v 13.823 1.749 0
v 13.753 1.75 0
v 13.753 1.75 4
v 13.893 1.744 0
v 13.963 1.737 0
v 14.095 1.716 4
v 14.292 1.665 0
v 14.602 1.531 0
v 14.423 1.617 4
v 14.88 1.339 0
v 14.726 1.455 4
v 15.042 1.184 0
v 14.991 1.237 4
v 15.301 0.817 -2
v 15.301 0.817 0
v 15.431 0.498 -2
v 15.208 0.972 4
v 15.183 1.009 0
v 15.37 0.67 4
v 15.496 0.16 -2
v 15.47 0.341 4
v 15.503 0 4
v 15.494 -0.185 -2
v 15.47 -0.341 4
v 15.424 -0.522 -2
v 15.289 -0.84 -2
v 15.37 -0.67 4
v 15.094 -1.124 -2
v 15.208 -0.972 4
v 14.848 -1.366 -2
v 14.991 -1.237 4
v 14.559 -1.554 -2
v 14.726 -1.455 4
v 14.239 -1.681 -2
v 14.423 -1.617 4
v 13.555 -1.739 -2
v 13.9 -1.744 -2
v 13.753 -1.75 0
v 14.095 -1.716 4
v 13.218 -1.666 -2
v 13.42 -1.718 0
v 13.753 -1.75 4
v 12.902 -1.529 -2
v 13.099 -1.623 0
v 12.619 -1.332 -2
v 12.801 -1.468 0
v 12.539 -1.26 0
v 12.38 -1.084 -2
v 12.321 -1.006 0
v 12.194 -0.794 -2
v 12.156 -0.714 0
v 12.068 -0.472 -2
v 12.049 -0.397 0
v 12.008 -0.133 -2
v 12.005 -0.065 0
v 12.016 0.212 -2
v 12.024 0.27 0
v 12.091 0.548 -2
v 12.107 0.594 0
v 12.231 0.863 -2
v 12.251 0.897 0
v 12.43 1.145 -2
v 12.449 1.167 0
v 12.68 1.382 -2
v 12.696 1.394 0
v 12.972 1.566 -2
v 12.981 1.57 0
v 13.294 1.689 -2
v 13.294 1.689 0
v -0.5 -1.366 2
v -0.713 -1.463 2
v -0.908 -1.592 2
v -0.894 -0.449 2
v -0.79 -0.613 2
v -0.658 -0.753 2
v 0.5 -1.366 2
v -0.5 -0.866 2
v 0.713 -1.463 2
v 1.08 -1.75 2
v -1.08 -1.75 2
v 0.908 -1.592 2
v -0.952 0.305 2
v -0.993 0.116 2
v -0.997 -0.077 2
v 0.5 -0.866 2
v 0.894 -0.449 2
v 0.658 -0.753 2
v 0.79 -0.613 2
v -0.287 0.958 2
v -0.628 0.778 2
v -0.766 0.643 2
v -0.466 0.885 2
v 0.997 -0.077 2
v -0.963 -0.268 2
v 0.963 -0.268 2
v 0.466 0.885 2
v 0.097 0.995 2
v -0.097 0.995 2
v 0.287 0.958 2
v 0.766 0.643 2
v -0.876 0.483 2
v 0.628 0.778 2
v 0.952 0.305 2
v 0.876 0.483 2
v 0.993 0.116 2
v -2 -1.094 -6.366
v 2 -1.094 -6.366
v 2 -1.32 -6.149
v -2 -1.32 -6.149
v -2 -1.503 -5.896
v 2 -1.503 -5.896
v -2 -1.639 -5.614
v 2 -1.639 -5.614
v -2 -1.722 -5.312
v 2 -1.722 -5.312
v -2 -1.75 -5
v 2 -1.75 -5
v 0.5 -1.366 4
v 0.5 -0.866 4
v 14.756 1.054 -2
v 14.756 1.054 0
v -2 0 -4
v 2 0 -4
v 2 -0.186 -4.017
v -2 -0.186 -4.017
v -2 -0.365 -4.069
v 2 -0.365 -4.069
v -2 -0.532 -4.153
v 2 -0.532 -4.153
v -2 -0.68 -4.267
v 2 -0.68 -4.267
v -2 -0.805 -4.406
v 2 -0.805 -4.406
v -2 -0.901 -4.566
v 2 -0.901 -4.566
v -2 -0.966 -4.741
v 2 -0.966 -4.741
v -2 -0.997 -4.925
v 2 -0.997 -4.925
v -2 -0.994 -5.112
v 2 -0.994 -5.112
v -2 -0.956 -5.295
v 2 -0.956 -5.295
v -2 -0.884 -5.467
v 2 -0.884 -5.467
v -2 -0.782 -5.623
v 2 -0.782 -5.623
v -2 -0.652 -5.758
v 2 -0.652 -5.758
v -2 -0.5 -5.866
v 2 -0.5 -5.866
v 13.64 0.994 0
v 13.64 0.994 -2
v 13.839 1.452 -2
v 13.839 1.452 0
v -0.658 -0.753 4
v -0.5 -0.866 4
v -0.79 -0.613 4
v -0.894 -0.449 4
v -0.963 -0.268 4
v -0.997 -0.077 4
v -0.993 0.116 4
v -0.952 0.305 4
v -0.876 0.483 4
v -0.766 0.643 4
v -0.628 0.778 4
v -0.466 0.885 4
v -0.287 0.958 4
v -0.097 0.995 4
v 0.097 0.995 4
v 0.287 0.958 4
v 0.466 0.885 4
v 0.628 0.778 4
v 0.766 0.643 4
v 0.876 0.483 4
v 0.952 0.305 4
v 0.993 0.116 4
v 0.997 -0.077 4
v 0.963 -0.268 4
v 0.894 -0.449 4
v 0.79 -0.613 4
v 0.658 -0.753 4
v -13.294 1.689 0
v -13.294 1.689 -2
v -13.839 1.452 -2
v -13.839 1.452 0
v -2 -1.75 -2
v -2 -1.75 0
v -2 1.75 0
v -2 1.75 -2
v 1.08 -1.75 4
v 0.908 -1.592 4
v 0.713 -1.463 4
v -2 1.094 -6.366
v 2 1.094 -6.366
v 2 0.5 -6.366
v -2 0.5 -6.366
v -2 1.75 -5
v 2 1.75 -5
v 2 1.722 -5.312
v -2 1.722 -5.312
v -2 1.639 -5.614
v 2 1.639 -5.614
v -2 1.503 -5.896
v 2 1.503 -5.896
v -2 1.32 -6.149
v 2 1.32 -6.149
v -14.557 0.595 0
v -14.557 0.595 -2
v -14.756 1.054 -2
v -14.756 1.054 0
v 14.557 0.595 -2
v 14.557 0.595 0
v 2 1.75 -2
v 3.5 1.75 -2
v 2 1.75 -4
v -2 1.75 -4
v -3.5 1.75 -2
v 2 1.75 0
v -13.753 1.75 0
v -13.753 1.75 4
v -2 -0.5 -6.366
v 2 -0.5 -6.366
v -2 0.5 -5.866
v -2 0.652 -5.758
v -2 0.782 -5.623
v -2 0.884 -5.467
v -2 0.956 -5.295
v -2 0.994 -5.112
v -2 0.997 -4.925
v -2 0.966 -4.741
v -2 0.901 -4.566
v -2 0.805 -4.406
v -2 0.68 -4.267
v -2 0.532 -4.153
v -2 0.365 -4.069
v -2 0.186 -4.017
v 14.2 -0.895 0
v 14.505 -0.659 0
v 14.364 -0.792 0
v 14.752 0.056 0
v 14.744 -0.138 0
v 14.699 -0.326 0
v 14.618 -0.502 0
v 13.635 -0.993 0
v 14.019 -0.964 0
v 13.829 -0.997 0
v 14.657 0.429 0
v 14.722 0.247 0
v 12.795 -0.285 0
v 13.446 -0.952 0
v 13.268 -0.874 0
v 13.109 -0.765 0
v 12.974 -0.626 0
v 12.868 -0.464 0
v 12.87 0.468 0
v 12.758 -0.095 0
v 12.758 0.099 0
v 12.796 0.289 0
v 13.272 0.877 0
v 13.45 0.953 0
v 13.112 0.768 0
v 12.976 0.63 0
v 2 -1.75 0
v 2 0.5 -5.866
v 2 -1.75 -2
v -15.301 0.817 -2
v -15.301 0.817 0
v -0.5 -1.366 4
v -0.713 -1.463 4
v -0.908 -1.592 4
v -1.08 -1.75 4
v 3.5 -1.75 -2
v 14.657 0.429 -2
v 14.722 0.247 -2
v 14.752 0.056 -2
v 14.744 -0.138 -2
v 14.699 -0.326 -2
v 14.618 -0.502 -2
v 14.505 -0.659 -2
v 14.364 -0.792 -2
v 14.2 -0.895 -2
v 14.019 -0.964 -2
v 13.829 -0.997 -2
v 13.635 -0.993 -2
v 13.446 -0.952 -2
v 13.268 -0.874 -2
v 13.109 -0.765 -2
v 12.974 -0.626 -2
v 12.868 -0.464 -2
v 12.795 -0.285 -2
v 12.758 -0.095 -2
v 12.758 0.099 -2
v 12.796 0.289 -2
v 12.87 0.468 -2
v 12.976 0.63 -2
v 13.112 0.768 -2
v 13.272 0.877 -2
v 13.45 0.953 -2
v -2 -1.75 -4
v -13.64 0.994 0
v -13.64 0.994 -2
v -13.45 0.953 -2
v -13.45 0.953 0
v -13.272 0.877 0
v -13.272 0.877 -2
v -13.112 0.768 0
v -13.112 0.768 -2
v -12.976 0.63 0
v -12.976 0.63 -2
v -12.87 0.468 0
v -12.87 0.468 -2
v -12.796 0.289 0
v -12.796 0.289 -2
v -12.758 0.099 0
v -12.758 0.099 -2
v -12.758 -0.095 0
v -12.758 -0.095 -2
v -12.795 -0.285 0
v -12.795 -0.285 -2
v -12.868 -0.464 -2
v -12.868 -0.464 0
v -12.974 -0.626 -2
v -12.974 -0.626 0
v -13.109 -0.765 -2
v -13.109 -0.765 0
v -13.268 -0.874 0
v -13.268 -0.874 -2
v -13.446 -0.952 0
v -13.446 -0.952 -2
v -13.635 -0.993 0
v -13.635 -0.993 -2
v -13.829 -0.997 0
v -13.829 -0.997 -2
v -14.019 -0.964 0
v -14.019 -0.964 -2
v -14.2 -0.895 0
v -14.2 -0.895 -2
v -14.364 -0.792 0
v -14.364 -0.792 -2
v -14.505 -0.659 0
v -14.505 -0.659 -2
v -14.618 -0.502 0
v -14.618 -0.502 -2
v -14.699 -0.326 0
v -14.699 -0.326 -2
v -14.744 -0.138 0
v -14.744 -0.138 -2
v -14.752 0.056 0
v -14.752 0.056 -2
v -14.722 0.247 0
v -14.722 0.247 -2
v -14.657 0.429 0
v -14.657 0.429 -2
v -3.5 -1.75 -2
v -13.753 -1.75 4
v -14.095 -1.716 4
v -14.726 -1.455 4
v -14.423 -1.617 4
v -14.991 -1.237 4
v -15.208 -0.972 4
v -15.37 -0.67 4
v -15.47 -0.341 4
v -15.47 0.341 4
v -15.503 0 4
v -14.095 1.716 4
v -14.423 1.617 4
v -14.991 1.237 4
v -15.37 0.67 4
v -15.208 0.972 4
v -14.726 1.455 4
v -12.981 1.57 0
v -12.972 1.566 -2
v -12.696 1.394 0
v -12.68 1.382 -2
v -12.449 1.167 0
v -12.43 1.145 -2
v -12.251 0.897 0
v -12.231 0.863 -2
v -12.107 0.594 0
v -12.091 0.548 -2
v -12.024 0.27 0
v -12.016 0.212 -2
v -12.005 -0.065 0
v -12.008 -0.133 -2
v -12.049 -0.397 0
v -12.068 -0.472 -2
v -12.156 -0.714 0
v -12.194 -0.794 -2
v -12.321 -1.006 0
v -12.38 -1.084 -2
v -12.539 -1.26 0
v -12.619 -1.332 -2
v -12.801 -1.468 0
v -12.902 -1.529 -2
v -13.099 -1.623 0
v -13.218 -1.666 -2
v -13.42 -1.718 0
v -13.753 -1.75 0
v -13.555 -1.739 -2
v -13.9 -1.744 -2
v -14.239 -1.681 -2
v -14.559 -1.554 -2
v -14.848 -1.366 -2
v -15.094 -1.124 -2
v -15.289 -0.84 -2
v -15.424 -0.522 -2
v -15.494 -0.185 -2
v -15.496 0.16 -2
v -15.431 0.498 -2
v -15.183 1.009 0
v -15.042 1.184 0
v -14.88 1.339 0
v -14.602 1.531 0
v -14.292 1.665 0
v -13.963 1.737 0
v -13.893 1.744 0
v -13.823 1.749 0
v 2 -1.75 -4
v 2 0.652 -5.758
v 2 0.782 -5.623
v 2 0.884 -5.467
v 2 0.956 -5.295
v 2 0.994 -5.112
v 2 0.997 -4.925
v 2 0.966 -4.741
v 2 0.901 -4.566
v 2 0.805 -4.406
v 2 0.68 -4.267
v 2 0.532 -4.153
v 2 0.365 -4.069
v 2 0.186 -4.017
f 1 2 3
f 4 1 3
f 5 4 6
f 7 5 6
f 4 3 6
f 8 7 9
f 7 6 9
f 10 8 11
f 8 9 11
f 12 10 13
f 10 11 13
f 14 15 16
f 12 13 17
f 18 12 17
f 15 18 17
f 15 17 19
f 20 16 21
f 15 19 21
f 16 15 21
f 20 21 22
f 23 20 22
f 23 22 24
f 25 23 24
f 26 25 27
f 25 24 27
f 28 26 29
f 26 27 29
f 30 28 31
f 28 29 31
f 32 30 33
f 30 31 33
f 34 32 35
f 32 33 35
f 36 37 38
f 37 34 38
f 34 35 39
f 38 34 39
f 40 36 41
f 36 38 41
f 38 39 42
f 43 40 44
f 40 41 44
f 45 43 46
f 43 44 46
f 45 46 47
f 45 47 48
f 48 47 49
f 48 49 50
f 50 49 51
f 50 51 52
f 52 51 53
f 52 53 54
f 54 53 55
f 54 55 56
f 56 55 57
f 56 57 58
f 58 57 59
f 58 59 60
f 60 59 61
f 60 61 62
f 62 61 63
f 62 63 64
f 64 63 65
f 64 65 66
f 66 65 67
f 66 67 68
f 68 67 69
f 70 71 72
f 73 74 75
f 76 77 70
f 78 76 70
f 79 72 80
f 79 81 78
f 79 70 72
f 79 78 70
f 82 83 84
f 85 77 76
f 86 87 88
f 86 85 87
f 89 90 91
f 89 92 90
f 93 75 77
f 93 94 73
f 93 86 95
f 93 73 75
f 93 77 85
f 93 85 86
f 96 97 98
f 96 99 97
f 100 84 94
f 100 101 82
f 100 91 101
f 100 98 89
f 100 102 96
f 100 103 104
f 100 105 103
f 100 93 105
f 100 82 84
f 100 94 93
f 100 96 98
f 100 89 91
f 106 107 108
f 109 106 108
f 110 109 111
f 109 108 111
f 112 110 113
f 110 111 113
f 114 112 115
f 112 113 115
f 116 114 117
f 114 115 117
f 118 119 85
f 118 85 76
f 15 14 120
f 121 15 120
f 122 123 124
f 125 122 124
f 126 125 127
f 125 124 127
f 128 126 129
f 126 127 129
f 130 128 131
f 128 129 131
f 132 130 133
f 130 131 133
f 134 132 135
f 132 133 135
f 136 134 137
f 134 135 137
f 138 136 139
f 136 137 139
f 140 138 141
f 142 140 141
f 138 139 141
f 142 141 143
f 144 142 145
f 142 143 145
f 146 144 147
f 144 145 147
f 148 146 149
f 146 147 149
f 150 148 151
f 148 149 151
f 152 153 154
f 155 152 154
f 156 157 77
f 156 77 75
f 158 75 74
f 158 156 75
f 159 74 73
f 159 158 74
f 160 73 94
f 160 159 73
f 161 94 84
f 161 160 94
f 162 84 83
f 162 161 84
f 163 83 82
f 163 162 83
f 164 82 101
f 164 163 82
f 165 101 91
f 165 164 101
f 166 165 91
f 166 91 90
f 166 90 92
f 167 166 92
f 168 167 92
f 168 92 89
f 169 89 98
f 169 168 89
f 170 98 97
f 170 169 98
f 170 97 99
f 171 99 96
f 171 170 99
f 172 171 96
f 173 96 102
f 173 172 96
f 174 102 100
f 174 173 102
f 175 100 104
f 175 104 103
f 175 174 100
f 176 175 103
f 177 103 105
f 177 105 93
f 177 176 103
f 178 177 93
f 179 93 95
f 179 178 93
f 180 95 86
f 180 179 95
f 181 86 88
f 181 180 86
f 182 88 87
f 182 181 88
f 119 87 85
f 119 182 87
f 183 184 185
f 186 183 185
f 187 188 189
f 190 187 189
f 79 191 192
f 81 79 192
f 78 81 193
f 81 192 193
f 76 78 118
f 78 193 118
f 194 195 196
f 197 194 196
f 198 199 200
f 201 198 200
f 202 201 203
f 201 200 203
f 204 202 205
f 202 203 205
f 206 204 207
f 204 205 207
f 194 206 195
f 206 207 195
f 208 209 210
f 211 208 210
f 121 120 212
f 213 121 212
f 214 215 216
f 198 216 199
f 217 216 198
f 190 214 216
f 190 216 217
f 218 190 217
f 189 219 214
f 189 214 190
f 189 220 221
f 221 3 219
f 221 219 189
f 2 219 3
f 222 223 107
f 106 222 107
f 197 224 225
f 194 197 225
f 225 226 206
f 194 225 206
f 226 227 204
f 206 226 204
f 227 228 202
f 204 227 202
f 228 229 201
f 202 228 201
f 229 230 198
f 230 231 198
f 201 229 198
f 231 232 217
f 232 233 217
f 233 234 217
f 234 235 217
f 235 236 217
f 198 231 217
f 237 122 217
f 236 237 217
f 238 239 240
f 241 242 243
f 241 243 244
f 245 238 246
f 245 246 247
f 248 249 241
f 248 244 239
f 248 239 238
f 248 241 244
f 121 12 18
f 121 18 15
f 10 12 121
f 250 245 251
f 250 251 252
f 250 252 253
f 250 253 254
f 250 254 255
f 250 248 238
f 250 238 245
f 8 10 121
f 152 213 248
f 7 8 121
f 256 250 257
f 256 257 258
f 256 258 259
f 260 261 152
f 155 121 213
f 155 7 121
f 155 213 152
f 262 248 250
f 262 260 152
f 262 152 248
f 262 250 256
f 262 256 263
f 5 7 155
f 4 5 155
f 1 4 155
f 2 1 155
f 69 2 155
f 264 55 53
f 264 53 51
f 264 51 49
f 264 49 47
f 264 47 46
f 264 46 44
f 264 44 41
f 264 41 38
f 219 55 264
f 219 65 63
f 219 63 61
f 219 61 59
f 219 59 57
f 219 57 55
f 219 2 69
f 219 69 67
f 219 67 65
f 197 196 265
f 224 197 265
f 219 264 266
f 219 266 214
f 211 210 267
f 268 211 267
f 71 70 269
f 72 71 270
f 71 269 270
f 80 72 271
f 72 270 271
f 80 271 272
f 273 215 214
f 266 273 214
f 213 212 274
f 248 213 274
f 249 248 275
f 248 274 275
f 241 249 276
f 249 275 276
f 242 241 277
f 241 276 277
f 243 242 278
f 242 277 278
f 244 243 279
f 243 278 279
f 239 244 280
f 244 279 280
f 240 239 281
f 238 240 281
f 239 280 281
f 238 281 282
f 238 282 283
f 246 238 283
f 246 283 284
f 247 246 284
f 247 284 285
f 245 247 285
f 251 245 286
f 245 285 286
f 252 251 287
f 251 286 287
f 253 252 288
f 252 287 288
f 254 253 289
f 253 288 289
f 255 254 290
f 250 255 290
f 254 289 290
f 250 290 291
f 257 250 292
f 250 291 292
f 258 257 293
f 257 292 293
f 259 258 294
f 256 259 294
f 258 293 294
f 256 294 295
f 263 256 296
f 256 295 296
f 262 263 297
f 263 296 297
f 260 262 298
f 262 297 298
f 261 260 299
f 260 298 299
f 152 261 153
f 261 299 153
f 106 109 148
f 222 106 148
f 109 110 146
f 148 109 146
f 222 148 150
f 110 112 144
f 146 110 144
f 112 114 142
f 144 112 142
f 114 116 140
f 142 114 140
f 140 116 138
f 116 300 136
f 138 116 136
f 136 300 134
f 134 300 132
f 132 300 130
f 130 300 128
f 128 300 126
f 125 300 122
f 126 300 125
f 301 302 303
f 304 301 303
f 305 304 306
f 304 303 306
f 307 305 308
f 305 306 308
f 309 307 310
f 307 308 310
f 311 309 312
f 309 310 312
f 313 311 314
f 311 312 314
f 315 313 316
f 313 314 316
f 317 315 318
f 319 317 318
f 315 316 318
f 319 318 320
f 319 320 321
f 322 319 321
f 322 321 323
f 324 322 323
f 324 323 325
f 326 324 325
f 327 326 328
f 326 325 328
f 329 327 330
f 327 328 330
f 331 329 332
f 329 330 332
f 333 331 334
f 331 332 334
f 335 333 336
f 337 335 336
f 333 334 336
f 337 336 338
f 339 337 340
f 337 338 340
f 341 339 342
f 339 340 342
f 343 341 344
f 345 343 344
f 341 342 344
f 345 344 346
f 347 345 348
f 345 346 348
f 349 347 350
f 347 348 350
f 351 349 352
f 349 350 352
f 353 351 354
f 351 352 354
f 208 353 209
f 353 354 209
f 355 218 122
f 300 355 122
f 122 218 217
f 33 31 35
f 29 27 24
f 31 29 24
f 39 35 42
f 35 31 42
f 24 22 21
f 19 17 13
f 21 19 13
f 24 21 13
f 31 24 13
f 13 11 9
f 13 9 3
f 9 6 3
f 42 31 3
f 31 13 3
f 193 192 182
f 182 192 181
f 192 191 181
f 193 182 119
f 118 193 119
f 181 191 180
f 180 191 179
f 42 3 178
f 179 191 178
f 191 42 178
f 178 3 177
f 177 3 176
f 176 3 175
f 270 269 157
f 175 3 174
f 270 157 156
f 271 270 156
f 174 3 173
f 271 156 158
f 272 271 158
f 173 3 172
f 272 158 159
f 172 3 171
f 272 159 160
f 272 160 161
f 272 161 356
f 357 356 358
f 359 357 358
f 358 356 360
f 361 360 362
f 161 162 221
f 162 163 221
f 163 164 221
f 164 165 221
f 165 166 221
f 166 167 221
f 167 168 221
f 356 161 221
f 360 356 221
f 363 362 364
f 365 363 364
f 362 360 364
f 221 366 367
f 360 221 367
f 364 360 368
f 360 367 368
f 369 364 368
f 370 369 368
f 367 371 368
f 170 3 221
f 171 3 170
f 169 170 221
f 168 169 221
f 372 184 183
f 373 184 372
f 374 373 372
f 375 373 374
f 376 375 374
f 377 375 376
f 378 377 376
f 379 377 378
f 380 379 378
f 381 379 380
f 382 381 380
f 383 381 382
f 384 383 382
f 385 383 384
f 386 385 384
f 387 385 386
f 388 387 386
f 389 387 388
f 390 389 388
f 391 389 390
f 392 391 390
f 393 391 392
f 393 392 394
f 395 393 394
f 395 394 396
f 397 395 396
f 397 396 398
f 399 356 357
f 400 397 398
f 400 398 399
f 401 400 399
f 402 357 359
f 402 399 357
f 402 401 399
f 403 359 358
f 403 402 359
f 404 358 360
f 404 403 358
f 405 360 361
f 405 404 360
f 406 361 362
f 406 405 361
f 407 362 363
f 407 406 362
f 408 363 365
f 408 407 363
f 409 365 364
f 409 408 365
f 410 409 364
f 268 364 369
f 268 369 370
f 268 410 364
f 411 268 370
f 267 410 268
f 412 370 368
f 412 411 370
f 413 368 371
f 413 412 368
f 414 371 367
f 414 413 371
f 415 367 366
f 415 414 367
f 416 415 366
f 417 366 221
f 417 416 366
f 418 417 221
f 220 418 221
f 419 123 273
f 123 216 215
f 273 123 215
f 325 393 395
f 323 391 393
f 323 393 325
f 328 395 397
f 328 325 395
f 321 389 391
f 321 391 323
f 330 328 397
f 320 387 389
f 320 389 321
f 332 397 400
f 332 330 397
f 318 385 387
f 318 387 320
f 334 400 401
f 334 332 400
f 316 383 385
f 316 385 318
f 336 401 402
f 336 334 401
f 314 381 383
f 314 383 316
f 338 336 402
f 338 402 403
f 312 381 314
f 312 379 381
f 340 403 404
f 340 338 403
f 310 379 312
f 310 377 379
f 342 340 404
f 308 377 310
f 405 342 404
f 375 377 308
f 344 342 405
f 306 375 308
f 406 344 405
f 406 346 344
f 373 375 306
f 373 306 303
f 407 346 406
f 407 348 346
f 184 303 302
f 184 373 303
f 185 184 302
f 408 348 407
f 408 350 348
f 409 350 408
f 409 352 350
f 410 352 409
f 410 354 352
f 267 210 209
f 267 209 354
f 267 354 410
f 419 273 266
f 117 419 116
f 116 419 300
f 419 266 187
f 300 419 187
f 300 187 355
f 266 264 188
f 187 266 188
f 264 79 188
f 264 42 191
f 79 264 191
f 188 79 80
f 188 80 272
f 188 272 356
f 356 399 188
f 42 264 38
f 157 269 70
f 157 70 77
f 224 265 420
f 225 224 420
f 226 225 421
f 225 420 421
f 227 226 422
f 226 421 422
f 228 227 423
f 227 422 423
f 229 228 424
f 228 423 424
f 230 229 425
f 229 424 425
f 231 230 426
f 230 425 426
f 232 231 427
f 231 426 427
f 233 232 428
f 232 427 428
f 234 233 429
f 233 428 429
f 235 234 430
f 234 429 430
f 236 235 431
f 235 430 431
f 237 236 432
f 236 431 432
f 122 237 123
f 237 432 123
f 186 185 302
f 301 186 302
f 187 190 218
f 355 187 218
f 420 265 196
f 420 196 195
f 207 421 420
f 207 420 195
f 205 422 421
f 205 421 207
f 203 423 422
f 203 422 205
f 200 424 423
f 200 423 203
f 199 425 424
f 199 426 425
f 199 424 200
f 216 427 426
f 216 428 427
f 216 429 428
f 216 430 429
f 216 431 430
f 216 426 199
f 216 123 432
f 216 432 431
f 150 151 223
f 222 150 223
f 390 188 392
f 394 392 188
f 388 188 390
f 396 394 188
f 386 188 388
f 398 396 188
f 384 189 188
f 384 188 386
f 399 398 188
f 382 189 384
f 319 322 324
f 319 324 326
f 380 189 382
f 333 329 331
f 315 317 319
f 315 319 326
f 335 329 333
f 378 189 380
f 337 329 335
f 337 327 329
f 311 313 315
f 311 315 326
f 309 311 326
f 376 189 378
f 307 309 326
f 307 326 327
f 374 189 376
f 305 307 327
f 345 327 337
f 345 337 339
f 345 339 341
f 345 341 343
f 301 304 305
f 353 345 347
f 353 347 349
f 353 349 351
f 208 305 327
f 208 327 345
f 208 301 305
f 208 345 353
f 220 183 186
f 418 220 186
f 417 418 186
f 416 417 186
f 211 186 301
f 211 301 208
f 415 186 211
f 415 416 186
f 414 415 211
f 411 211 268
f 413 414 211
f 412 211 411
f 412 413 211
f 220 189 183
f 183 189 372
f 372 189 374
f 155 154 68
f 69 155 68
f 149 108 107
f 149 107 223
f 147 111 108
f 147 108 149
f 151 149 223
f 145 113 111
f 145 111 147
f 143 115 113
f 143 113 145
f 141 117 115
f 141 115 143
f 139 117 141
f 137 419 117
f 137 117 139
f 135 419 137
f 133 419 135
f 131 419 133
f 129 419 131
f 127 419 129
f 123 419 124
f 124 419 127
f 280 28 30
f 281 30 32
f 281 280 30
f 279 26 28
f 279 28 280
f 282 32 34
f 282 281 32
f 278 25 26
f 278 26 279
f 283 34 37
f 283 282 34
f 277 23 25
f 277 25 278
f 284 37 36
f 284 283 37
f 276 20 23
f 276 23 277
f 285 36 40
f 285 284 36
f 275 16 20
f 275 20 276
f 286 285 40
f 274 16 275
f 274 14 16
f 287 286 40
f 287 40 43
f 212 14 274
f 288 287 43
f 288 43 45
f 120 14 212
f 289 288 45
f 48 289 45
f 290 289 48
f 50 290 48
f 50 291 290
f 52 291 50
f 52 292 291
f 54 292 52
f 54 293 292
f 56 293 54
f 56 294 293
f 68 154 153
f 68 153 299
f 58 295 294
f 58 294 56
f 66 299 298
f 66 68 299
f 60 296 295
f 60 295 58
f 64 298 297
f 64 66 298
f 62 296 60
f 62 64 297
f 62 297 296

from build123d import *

# Parameters (mm, degrees)
EXTRUDE_1_DEPTH     = 4
SKETCH_2_W          = 4
SKETCH_2_H          = 3.5
EXTRUDE_2_DEPTH     = 2
EXTRUDE_3_DEPTH     = 3.5
EXTRUDE_START       = 2
SKETCH_4_R          = 1.75
EXTRUDE_4_DEPTH     = 2
CUT_EXTRUDE_2_DEPTH = 2
SKETCH_7_W          = 4
SKETCH_7_H          = 3.5
EXTRUDE_5_DEPTH     = 4
CUT_EXTRUDE_4_DEPTH = 4
CUT_EXTRUDE_5_DEPTH = 2


with BuildPart() as part:
    # 草图1 → 凸台-拉伸1 (new body)
    with BuildSketch(Plane.XY):
        with BuildLine():
            Line((-13.7534088, 1.75), (13.7534088, 1.75))
            ThreePointArc((13.7534088, 1.75), (15.5034088, 0), (13.7534088, -1.75))
            Line((13.7534088, -1.75), (-13.7534088, -1.75))
            ThreePointArc((-13.7534088, -1.75), (-15.5034088, 0), (-13.7534088, 1.75))
        make_face()
    extrude(amount=EXTRUDE_1_DEPTH)

    # 草图2 → 凸台-拉伸2 (add)
    with BuildSketch(Plane(origin=(0, 0, 0), x_dir=(-1, 0, 0), z_dir=(0, 0, -1))):
        Rectangle(SKETCH_2_W, SKETCH_2_H)
    extrude(amount=EXTRUDE_2_DEPTH)

    # 草图3 → 凸台-拉伸3 (add)
    with BuildSketch(Plane(origin=(0, 1.75, 0), x_dir=(1, 0, 0), z_dir=(0, 1, 0))):
        Polygon((3.5, 2), (-3.5, 2), (-2, 4), (2, 4), align=None)
    extrude(amount=-EXTRUDE_3_DEPTH)

    # 草图4 → 凸台-拉伸4 (add)
    with BuildSketch(Plane(origin=(0, 0, 0), x_dir=(-1, 0, 0), z_dir=(0, 0, -1)).offset(EXTRUDE_START)):
        with Locations((-13.7534088, 0)):
            Circle(SKETCH_4_R)
        with Locations((13.7534088, 0)):
            Circle(SKETCH_4_R)
    extrude(amount=-EXTRUDE_4_DEPTH)

    # 草图5 → 切除-拉伸2 (cut)
    with BuildSketch(Plane.XY.offset(4)):
        with BuildLine():
            ThreePointArc((1.079530307, -1.75), (0.812765723, -1.523298095), (0.5, -1.366025404))
            Line((0.5, -1.366025404), (0.5, -0.866025404))
            ThreePointArc((0.5, -0.866025404), (0, 1), (-0.5, -0.866025404))
            Line((-0.5, -0.866025404), (-0.5, -1.366025404))
            ThreePointArc((-0.5, -1.366025404), (-0.812765723, -1.523298095), (-1.079530307, -1.75))
            Line((-1.079530307, -1.75), (1.079530307, -1.75))
        make_face()
    extrude(amount=-CUT_EXTRUDE_2_DEPTH, mode=Mode.SUBTRACT)

    # 草图7 → 凸台-拉伸5 (add)
    with BuildSketch(Plane(origin=(0, 0, -4), x_dir=(-1, 0, 0), z_dir=(0, 0, -1))):
        Rectangle(SKETCH_7_W, SKETCH_7_H)
    extrude(amount=EXTRUDE_5_DEPTH)

    # 草图8 → 切除-拉伸4 (cut)
    with BuildSketch(Plane(origin=(2, 0, 0), x_dir=(0, 0, -1), z_dir=(1, 0, 0))):
        with BuildLine():
            ThreePointArc((5.866025404, 0.5), (4, 0), (5.866025404, -0.5))
            Line((5.866025404, -0.5), (6.366025404, -0.5))
            Line((6.366025404, -0.5), (6.366025404, -1.093834812))
            ThreePointArc((6.366025404, -1.093834812), (5.75772326, -1.577452205), (5, -1.75))
            Line((5, -1.75), (8, -1.75))
            Line((8, -1.75), (8, 1.75))
            Line((8, 1.75), (5, 1.75))
            ThreePointArc((5, 1.75), (5.75772326, 1.577452205), (6.366025404, 1.093834812))
            Line((6.366025404, 1.093834812), (6.366025404, 0.5))
            Line((6.366025404, 0.5), (5.866025404, 0.5))
        make_face()
    extrude(amount=-CUT_EXTRUDE_4_DEPTH, mode=Mode.SUBTRACT)

    # 草图6 → 切除-拉伸5 (cut)
    with BuildSketch(Plane(origin=(0, 0, -2), x_dir=(-1, 0, 0), z_dir=(0, 0, -1))):
        with BuildLine():
            Line((13.83870568, 1.45215352), (13.639607299, 0.993503507))
            ThreePointArc((13.639607299, 0.993503507), (13.355212038, -0.917300026), (14.556907325, 0.595306745))
            Line((14.556907325, 0.595306745), (14.756005706, 1.053956758))
            Line((14.756005706, 1.053956758), (15.300730395, 0.817493658))
            ThreePointArc((15.300730395, 0.817493658), (14.450253134, 1.605275046), (13.293980991, 1.68861662))
            Line((13.293980991, 1.68861662), (13.83870568, 1.45215352))
        make_face()
        with BuildLine():
            Line((-14.756005706, 1.053956758), (-14.556907325, 0.595306745))
            ThreePointArc((-14.556907325, 0.595306745), (-13.355212038, -0.917300026), (-13.639607299, 0.993503507))
            Line((-13.639607299, 0.993503507), (-13.83870568, 1.45215352))
            Line((-13.83870568, 1.45215352), (-13.293980991, 1.68861662))
            ThreePointArc((-13.293980991, 1.68861662), (-14.450253134, 1.605275046), (-15.300730395, 0.817493658))
            Line((-15.300730395, 0.817493658), (-14.756005706, 1.053956758))
        make_face()
    extrude(amount=-CUT_EXTRUDE_5_DEPTH, mode=Mode.SUBTRACT)


solid = part.part
